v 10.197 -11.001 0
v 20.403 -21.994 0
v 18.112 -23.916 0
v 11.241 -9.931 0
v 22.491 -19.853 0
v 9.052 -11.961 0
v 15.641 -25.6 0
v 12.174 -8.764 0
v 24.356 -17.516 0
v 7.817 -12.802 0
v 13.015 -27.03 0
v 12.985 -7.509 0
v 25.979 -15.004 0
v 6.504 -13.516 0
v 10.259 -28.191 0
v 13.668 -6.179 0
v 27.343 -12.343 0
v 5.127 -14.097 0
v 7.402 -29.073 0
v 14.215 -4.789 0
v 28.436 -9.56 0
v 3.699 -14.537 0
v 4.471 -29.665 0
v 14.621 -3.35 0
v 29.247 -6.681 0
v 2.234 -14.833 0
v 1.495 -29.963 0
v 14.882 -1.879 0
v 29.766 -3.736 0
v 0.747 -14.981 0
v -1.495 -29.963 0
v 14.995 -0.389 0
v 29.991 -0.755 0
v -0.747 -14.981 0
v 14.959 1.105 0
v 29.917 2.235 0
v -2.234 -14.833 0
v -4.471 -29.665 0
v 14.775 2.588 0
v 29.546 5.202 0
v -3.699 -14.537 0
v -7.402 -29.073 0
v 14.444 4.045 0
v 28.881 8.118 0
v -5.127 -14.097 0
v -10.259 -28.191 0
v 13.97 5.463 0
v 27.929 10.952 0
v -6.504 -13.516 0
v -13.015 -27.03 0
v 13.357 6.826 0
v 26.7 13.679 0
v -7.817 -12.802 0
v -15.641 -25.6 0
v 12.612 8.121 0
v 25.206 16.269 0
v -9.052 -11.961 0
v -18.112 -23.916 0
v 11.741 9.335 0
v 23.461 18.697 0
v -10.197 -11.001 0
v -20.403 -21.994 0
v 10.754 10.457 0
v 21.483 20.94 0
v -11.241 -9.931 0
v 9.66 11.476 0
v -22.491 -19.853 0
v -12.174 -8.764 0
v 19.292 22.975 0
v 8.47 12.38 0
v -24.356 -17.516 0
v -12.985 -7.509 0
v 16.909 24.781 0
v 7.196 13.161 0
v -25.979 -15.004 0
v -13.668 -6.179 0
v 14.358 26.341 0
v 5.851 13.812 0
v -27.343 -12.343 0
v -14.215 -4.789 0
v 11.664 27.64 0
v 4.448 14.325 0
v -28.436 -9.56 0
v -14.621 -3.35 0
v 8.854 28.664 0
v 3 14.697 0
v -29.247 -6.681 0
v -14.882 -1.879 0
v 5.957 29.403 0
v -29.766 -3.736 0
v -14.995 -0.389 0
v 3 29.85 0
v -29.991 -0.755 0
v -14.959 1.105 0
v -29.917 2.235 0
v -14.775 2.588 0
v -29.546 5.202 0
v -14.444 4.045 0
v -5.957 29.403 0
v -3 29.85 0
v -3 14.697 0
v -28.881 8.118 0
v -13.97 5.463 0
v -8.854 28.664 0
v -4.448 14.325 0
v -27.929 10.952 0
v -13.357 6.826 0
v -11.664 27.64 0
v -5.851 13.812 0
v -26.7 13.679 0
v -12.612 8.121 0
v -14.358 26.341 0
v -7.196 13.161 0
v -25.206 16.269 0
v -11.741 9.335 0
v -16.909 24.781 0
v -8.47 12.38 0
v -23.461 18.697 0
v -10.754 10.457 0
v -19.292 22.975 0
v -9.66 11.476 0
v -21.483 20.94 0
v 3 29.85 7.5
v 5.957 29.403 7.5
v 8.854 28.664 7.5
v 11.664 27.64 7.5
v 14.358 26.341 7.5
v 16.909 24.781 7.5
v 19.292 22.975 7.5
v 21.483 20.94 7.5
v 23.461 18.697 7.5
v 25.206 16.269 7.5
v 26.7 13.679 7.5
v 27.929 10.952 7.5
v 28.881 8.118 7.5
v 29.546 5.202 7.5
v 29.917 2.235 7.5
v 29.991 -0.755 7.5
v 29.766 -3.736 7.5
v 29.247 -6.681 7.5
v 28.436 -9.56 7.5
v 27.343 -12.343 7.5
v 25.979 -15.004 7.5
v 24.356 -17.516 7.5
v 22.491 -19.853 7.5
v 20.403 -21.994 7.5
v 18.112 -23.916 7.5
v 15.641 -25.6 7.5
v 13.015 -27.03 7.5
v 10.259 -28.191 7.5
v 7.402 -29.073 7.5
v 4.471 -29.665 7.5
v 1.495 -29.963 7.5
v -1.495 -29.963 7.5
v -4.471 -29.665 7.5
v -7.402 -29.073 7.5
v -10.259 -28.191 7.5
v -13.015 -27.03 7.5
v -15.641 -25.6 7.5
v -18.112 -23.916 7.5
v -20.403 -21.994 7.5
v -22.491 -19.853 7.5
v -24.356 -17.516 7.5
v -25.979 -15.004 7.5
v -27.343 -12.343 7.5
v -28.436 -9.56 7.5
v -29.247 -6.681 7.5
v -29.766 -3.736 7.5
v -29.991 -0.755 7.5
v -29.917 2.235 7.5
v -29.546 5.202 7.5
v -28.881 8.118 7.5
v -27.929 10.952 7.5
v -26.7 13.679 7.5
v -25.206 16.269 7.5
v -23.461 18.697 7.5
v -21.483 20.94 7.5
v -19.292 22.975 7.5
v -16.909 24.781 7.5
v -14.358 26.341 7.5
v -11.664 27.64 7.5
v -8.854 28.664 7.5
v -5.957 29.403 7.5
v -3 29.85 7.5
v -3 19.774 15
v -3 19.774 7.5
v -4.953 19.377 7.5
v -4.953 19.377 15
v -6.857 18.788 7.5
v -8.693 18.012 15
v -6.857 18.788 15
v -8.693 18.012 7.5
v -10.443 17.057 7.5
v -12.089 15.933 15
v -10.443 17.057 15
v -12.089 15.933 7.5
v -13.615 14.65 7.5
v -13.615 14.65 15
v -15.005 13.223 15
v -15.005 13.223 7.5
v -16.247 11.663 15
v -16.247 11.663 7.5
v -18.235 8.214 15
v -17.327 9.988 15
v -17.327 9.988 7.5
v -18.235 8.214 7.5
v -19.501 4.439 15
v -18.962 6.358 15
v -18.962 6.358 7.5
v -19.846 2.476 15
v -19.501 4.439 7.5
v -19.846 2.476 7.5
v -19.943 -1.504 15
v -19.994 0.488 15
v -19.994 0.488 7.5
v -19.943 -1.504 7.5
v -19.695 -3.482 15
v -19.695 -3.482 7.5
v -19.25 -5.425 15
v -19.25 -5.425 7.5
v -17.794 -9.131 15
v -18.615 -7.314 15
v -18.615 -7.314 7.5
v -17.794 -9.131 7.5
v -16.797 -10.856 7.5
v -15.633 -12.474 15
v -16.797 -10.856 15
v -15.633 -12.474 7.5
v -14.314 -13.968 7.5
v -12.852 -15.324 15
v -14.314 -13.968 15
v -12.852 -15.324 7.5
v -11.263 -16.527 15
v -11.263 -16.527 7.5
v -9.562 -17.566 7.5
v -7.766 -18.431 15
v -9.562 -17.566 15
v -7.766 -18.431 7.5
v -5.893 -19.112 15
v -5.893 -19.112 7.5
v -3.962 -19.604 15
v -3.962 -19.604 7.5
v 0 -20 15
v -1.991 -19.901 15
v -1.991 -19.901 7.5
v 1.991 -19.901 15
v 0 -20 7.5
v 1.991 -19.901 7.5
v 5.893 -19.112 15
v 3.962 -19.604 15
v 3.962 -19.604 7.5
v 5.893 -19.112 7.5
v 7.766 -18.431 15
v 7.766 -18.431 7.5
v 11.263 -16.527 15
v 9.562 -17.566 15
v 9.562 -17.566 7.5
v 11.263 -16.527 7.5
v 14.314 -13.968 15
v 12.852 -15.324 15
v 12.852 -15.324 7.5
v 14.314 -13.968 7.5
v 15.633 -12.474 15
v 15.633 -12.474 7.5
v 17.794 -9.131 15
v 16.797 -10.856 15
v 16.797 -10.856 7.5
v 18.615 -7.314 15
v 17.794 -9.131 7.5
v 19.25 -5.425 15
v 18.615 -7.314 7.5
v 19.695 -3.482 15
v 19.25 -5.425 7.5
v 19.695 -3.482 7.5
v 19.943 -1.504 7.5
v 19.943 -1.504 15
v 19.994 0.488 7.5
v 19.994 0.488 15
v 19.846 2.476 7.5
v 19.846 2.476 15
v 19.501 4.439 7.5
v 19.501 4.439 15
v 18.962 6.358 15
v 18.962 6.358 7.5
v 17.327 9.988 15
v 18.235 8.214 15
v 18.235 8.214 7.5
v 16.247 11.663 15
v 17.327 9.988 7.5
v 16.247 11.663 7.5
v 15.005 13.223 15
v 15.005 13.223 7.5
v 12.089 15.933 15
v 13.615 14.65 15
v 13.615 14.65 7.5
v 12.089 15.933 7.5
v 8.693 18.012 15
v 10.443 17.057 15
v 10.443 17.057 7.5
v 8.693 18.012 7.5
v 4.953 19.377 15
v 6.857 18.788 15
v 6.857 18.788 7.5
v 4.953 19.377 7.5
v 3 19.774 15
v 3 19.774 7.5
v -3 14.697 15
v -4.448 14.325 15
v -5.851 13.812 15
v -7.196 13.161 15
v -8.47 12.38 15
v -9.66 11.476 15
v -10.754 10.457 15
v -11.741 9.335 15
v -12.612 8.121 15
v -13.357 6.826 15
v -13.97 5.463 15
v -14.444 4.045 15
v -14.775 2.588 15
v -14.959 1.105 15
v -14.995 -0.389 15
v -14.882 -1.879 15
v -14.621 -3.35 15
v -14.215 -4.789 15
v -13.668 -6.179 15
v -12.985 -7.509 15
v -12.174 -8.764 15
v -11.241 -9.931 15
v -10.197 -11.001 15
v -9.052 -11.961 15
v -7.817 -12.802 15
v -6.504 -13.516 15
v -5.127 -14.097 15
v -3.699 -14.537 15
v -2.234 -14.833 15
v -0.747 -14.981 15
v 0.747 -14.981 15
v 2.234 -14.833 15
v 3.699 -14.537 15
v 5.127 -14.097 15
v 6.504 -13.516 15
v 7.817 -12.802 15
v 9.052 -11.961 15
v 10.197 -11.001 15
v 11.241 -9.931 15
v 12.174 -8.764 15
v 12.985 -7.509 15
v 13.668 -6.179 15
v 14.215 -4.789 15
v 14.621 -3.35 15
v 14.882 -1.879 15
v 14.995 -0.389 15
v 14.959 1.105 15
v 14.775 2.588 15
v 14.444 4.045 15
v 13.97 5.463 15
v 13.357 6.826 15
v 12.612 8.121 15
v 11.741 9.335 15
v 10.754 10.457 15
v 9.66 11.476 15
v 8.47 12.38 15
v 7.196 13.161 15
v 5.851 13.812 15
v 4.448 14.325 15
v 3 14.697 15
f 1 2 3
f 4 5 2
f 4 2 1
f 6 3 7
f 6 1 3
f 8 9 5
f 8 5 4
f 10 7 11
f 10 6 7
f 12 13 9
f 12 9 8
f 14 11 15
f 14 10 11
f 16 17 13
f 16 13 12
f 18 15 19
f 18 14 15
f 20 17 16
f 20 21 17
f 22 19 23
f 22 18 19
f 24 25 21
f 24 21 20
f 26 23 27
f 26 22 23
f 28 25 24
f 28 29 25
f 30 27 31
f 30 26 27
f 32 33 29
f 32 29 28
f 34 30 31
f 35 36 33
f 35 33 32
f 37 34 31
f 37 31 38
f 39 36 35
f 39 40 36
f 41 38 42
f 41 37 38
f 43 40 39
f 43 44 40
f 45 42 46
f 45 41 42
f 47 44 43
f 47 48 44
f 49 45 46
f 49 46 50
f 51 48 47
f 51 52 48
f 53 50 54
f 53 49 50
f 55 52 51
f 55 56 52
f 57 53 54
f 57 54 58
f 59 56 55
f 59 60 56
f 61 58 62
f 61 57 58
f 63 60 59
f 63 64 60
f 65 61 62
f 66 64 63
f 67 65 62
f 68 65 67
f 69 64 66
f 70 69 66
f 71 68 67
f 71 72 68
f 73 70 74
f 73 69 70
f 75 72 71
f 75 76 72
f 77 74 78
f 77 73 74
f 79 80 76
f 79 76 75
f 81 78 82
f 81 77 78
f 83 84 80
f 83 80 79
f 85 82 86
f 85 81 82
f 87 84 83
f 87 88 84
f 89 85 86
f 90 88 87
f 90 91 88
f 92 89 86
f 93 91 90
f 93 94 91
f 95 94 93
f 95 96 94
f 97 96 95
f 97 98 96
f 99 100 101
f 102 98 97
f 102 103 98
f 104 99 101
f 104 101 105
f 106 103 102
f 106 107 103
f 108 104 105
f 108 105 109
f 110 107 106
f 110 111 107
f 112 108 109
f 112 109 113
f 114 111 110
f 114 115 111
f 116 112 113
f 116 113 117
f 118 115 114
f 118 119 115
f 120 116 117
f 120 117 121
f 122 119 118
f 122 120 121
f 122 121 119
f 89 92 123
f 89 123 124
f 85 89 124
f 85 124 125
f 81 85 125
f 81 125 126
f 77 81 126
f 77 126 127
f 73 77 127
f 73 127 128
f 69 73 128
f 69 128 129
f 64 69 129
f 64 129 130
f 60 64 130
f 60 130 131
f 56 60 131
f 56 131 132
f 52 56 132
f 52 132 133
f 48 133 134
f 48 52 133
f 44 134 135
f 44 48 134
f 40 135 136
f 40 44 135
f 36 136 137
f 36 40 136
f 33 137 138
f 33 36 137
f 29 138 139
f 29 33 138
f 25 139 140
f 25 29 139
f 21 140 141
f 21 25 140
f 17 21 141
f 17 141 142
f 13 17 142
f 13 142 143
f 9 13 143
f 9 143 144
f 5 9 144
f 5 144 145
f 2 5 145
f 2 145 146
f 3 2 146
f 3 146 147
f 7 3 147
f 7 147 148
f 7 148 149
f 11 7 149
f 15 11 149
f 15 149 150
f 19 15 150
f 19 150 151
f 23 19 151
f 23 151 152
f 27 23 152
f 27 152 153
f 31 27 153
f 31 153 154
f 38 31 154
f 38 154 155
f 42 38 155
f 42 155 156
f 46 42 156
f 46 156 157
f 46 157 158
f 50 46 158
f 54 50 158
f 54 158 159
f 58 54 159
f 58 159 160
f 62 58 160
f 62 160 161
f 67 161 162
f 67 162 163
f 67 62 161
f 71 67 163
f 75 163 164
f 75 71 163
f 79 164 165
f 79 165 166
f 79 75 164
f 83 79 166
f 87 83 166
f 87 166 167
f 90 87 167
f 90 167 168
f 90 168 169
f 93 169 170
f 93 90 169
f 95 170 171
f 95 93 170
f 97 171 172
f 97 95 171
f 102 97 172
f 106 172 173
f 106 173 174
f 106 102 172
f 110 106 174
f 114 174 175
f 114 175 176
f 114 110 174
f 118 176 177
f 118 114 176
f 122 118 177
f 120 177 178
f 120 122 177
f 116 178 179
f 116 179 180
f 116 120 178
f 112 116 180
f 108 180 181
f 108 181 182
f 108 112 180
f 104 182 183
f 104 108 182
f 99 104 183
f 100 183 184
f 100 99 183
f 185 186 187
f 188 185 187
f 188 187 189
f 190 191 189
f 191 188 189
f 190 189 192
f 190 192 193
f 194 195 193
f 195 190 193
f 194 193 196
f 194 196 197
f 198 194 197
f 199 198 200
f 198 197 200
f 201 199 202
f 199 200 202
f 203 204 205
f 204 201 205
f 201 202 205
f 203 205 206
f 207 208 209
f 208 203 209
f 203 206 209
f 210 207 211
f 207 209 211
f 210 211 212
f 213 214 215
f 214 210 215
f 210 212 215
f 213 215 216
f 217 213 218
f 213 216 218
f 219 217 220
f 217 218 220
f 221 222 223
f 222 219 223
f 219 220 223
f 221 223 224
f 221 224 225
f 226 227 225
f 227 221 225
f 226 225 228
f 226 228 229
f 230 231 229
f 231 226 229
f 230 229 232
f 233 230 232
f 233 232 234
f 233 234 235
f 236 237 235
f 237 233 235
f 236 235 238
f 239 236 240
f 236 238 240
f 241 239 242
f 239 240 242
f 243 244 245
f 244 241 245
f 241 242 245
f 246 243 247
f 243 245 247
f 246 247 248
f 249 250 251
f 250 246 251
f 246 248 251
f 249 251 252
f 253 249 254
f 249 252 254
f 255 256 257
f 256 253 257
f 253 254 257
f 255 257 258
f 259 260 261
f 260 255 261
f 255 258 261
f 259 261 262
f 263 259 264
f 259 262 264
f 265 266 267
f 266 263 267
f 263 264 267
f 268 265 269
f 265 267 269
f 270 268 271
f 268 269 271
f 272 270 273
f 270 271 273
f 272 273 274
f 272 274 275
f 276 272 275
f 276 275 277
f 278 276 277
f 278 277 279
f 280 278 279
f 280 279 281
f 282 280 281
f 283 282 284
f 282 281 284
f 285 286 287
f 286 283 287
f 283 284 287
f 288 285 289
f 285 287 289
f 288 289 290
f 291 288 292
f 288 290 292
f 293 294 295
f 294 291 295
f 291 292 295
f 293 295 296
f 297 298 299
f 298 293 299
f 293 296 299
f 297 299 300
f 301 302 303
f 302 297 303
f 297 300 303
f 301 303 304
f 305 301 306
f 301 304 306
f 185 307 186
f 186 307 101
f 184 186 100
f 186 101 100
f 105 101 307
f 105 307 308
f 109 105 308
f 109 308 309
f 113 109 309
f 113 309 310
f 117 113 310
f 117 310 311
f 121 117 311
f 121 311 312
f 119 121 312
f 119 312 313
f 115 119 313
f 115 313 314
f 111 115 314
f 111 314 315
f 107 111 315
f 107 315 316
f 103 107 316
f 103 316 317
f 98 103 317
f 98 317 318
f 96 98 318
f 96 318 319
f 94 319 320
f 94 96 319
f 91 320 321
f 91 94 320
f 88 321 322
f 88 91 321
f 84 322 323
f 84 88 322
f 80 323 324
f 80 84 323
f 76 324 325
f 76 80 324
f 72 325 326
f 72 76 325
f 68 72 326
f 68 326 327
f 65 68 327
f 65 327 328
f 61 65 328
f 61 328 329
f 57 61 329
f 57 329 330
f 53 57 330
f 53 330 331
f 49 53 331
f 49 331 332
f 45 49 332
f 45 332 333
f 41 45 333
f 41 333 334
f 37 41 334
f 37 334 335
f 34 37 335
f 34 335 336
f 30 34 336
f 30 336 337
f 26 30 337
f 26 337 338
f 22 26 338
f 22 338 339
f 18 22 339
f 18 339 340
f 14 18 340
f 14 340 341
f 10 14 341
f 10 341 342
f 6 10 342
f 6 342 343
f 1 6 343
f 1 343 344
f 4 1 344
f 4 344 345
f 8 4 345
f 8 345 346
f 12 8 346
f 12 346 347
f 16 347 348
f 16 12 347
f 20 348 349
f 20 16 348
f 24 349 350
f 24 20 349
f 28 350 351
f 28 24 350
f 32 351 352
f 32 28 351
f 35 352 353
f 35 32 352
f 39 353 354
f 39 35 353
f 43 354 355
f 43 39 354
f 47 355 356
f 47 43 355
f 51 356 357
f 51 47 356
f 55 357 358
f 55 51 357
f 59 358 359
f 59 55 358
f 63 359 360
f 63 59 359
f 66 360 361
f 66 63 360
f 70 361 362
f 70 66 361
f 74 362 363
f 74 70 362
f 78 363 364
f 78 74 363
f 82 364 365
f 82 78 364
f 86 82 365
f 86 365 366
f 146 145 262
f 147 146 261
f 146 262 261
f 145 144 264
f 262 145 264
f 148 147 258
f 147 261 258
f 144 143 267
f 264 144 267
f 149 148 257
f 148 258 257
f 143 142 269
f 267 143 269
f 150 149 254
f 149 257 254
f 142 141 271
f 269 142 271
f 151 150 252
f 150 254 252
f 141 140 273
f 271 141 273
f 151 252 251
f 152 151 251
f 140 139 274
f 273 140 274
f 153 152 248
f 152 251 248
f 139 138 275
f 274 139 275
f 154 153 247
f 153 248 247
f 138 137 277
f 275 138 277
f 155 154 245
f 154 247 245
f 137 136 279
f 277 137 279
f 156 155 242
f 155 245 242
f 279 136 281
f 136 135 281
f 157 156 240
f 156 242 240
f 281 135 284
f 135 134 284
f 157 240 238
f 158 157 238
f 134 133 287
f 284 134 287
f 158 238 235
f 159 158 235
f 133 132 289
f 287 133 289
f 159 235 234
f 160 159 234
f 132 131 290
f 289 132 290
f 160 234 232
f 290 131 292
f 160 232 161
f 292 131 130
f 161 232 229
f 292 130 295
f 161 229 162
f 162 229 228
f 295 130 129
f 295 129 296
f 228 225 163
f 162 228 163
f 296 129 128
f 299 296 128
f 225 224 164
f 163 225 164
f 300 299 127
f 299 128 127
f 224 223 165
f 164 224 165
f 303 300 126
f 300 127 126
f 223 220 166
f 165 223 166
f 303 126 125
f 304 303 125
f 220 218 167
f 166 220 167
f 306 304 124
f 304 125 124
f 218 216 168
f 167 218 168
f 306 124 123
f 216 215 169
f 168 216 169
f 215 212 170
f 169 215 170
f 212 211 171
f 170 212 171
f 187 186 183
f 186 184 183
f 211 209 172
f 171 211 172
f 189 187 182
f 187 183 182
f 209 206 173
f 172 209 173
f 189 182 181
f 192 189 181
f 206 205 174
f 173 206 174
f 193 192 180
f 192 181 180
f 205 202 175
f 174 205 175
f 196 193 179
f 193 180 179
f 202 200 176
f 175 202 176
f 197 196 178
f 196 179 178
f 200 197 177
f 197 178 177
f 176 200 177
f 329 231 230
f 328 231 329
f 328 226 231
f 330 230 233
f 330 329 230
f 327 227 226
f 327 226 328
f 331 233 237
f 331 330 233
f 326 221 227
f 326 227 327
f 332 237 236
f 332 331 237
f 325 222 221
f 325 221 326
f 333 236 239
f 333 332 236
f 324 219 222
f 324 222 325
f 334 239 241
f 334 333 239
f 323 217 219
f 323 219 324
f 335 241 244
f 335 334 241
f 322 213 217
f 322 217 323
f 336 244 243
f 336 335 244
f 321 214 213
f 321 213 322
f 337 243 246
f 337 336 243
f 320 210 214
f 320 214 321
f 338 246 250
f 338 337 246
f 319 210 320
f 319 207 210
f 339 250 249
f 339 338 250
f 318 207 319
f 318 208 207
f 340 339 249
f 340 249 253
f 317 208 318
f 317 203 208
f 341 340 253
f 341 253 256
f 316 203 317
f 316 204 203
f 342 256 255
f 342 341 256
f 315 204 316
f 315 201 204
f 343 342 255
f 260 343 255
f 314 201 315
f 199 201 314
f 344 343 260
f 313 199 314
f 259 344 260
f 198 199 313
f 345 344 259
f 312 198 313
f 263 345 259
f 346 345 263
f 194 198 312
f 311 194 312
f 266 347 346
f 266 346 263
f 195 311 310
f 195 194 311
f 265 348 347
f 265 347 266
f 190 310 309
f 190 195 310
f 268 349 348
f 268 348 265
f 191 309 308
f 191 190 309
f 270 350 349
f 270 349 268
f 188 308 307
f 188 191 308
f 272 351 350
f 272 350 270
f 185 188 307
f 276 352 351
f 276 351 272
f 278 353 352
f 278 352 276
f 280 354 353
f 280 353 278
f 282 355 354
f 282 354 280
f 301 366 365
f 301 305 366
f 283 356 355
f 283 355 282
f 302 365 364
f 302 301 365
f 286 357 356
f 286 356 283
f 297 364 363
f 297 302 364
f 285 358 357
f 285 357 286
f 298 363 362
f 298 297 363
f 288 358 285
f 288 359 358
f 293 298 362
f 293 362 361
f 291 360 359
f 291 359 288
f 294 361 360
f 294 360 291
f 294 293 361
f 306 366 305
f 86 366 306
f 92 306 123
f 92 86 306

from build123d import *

# Parameters (mm, degrees)
SKETCH1_R           = 20
SKETCH1_R_2         = 15
BOSS_EXTRUDE1_DEPTH = 15
SKETCH2_R           = 30
SKETCH2_R_2         = 20
BOSS_EXTRUDE2_DEPTH = 7.5
SKETCH3_W           = 6
SKETCH3_H           = 34.327772866
CUT_EXTRUDE1_DEPTH  = 16


with BuildPart() as part:
    # Sketch1 → Boss-Extrude1 (new body)
    with BuildSketch(Plane.XY):
        Circle(SKETCH1_R)
        Circle(SKETCH1_R_2, mode=Mode.SUBTRACT)
    extrude(amount=BOSS_EXTRUDE1_DEPTH)

    # Sketch2 → Boss-Extrude2 (add)
    with BuildSketch(Plane(origin=(0, 0, 0), x_dir=(-1, 0, 0), z_dir=(0, 0, -1))):
        Circle(SKETCH2_R)
        Circle(SKETCH2_R_2, mode=Mode.SUBTRACT)
    extrude(amount=-BOSS_EXTRUDE2_DEPTH)

    # Sketch3 → Cut-Extrude1 (cut, through all)
    with BuildSketch(Plane.XY):
        with Locations((0, 17.163886433)):
            Rectangle(SKETCH3_W, SKETCH3_H)
    extrude(amount=CUT_EXTRUDE1_DEPTH, mode=Mode.SUBTRACT)


solid = part.part
